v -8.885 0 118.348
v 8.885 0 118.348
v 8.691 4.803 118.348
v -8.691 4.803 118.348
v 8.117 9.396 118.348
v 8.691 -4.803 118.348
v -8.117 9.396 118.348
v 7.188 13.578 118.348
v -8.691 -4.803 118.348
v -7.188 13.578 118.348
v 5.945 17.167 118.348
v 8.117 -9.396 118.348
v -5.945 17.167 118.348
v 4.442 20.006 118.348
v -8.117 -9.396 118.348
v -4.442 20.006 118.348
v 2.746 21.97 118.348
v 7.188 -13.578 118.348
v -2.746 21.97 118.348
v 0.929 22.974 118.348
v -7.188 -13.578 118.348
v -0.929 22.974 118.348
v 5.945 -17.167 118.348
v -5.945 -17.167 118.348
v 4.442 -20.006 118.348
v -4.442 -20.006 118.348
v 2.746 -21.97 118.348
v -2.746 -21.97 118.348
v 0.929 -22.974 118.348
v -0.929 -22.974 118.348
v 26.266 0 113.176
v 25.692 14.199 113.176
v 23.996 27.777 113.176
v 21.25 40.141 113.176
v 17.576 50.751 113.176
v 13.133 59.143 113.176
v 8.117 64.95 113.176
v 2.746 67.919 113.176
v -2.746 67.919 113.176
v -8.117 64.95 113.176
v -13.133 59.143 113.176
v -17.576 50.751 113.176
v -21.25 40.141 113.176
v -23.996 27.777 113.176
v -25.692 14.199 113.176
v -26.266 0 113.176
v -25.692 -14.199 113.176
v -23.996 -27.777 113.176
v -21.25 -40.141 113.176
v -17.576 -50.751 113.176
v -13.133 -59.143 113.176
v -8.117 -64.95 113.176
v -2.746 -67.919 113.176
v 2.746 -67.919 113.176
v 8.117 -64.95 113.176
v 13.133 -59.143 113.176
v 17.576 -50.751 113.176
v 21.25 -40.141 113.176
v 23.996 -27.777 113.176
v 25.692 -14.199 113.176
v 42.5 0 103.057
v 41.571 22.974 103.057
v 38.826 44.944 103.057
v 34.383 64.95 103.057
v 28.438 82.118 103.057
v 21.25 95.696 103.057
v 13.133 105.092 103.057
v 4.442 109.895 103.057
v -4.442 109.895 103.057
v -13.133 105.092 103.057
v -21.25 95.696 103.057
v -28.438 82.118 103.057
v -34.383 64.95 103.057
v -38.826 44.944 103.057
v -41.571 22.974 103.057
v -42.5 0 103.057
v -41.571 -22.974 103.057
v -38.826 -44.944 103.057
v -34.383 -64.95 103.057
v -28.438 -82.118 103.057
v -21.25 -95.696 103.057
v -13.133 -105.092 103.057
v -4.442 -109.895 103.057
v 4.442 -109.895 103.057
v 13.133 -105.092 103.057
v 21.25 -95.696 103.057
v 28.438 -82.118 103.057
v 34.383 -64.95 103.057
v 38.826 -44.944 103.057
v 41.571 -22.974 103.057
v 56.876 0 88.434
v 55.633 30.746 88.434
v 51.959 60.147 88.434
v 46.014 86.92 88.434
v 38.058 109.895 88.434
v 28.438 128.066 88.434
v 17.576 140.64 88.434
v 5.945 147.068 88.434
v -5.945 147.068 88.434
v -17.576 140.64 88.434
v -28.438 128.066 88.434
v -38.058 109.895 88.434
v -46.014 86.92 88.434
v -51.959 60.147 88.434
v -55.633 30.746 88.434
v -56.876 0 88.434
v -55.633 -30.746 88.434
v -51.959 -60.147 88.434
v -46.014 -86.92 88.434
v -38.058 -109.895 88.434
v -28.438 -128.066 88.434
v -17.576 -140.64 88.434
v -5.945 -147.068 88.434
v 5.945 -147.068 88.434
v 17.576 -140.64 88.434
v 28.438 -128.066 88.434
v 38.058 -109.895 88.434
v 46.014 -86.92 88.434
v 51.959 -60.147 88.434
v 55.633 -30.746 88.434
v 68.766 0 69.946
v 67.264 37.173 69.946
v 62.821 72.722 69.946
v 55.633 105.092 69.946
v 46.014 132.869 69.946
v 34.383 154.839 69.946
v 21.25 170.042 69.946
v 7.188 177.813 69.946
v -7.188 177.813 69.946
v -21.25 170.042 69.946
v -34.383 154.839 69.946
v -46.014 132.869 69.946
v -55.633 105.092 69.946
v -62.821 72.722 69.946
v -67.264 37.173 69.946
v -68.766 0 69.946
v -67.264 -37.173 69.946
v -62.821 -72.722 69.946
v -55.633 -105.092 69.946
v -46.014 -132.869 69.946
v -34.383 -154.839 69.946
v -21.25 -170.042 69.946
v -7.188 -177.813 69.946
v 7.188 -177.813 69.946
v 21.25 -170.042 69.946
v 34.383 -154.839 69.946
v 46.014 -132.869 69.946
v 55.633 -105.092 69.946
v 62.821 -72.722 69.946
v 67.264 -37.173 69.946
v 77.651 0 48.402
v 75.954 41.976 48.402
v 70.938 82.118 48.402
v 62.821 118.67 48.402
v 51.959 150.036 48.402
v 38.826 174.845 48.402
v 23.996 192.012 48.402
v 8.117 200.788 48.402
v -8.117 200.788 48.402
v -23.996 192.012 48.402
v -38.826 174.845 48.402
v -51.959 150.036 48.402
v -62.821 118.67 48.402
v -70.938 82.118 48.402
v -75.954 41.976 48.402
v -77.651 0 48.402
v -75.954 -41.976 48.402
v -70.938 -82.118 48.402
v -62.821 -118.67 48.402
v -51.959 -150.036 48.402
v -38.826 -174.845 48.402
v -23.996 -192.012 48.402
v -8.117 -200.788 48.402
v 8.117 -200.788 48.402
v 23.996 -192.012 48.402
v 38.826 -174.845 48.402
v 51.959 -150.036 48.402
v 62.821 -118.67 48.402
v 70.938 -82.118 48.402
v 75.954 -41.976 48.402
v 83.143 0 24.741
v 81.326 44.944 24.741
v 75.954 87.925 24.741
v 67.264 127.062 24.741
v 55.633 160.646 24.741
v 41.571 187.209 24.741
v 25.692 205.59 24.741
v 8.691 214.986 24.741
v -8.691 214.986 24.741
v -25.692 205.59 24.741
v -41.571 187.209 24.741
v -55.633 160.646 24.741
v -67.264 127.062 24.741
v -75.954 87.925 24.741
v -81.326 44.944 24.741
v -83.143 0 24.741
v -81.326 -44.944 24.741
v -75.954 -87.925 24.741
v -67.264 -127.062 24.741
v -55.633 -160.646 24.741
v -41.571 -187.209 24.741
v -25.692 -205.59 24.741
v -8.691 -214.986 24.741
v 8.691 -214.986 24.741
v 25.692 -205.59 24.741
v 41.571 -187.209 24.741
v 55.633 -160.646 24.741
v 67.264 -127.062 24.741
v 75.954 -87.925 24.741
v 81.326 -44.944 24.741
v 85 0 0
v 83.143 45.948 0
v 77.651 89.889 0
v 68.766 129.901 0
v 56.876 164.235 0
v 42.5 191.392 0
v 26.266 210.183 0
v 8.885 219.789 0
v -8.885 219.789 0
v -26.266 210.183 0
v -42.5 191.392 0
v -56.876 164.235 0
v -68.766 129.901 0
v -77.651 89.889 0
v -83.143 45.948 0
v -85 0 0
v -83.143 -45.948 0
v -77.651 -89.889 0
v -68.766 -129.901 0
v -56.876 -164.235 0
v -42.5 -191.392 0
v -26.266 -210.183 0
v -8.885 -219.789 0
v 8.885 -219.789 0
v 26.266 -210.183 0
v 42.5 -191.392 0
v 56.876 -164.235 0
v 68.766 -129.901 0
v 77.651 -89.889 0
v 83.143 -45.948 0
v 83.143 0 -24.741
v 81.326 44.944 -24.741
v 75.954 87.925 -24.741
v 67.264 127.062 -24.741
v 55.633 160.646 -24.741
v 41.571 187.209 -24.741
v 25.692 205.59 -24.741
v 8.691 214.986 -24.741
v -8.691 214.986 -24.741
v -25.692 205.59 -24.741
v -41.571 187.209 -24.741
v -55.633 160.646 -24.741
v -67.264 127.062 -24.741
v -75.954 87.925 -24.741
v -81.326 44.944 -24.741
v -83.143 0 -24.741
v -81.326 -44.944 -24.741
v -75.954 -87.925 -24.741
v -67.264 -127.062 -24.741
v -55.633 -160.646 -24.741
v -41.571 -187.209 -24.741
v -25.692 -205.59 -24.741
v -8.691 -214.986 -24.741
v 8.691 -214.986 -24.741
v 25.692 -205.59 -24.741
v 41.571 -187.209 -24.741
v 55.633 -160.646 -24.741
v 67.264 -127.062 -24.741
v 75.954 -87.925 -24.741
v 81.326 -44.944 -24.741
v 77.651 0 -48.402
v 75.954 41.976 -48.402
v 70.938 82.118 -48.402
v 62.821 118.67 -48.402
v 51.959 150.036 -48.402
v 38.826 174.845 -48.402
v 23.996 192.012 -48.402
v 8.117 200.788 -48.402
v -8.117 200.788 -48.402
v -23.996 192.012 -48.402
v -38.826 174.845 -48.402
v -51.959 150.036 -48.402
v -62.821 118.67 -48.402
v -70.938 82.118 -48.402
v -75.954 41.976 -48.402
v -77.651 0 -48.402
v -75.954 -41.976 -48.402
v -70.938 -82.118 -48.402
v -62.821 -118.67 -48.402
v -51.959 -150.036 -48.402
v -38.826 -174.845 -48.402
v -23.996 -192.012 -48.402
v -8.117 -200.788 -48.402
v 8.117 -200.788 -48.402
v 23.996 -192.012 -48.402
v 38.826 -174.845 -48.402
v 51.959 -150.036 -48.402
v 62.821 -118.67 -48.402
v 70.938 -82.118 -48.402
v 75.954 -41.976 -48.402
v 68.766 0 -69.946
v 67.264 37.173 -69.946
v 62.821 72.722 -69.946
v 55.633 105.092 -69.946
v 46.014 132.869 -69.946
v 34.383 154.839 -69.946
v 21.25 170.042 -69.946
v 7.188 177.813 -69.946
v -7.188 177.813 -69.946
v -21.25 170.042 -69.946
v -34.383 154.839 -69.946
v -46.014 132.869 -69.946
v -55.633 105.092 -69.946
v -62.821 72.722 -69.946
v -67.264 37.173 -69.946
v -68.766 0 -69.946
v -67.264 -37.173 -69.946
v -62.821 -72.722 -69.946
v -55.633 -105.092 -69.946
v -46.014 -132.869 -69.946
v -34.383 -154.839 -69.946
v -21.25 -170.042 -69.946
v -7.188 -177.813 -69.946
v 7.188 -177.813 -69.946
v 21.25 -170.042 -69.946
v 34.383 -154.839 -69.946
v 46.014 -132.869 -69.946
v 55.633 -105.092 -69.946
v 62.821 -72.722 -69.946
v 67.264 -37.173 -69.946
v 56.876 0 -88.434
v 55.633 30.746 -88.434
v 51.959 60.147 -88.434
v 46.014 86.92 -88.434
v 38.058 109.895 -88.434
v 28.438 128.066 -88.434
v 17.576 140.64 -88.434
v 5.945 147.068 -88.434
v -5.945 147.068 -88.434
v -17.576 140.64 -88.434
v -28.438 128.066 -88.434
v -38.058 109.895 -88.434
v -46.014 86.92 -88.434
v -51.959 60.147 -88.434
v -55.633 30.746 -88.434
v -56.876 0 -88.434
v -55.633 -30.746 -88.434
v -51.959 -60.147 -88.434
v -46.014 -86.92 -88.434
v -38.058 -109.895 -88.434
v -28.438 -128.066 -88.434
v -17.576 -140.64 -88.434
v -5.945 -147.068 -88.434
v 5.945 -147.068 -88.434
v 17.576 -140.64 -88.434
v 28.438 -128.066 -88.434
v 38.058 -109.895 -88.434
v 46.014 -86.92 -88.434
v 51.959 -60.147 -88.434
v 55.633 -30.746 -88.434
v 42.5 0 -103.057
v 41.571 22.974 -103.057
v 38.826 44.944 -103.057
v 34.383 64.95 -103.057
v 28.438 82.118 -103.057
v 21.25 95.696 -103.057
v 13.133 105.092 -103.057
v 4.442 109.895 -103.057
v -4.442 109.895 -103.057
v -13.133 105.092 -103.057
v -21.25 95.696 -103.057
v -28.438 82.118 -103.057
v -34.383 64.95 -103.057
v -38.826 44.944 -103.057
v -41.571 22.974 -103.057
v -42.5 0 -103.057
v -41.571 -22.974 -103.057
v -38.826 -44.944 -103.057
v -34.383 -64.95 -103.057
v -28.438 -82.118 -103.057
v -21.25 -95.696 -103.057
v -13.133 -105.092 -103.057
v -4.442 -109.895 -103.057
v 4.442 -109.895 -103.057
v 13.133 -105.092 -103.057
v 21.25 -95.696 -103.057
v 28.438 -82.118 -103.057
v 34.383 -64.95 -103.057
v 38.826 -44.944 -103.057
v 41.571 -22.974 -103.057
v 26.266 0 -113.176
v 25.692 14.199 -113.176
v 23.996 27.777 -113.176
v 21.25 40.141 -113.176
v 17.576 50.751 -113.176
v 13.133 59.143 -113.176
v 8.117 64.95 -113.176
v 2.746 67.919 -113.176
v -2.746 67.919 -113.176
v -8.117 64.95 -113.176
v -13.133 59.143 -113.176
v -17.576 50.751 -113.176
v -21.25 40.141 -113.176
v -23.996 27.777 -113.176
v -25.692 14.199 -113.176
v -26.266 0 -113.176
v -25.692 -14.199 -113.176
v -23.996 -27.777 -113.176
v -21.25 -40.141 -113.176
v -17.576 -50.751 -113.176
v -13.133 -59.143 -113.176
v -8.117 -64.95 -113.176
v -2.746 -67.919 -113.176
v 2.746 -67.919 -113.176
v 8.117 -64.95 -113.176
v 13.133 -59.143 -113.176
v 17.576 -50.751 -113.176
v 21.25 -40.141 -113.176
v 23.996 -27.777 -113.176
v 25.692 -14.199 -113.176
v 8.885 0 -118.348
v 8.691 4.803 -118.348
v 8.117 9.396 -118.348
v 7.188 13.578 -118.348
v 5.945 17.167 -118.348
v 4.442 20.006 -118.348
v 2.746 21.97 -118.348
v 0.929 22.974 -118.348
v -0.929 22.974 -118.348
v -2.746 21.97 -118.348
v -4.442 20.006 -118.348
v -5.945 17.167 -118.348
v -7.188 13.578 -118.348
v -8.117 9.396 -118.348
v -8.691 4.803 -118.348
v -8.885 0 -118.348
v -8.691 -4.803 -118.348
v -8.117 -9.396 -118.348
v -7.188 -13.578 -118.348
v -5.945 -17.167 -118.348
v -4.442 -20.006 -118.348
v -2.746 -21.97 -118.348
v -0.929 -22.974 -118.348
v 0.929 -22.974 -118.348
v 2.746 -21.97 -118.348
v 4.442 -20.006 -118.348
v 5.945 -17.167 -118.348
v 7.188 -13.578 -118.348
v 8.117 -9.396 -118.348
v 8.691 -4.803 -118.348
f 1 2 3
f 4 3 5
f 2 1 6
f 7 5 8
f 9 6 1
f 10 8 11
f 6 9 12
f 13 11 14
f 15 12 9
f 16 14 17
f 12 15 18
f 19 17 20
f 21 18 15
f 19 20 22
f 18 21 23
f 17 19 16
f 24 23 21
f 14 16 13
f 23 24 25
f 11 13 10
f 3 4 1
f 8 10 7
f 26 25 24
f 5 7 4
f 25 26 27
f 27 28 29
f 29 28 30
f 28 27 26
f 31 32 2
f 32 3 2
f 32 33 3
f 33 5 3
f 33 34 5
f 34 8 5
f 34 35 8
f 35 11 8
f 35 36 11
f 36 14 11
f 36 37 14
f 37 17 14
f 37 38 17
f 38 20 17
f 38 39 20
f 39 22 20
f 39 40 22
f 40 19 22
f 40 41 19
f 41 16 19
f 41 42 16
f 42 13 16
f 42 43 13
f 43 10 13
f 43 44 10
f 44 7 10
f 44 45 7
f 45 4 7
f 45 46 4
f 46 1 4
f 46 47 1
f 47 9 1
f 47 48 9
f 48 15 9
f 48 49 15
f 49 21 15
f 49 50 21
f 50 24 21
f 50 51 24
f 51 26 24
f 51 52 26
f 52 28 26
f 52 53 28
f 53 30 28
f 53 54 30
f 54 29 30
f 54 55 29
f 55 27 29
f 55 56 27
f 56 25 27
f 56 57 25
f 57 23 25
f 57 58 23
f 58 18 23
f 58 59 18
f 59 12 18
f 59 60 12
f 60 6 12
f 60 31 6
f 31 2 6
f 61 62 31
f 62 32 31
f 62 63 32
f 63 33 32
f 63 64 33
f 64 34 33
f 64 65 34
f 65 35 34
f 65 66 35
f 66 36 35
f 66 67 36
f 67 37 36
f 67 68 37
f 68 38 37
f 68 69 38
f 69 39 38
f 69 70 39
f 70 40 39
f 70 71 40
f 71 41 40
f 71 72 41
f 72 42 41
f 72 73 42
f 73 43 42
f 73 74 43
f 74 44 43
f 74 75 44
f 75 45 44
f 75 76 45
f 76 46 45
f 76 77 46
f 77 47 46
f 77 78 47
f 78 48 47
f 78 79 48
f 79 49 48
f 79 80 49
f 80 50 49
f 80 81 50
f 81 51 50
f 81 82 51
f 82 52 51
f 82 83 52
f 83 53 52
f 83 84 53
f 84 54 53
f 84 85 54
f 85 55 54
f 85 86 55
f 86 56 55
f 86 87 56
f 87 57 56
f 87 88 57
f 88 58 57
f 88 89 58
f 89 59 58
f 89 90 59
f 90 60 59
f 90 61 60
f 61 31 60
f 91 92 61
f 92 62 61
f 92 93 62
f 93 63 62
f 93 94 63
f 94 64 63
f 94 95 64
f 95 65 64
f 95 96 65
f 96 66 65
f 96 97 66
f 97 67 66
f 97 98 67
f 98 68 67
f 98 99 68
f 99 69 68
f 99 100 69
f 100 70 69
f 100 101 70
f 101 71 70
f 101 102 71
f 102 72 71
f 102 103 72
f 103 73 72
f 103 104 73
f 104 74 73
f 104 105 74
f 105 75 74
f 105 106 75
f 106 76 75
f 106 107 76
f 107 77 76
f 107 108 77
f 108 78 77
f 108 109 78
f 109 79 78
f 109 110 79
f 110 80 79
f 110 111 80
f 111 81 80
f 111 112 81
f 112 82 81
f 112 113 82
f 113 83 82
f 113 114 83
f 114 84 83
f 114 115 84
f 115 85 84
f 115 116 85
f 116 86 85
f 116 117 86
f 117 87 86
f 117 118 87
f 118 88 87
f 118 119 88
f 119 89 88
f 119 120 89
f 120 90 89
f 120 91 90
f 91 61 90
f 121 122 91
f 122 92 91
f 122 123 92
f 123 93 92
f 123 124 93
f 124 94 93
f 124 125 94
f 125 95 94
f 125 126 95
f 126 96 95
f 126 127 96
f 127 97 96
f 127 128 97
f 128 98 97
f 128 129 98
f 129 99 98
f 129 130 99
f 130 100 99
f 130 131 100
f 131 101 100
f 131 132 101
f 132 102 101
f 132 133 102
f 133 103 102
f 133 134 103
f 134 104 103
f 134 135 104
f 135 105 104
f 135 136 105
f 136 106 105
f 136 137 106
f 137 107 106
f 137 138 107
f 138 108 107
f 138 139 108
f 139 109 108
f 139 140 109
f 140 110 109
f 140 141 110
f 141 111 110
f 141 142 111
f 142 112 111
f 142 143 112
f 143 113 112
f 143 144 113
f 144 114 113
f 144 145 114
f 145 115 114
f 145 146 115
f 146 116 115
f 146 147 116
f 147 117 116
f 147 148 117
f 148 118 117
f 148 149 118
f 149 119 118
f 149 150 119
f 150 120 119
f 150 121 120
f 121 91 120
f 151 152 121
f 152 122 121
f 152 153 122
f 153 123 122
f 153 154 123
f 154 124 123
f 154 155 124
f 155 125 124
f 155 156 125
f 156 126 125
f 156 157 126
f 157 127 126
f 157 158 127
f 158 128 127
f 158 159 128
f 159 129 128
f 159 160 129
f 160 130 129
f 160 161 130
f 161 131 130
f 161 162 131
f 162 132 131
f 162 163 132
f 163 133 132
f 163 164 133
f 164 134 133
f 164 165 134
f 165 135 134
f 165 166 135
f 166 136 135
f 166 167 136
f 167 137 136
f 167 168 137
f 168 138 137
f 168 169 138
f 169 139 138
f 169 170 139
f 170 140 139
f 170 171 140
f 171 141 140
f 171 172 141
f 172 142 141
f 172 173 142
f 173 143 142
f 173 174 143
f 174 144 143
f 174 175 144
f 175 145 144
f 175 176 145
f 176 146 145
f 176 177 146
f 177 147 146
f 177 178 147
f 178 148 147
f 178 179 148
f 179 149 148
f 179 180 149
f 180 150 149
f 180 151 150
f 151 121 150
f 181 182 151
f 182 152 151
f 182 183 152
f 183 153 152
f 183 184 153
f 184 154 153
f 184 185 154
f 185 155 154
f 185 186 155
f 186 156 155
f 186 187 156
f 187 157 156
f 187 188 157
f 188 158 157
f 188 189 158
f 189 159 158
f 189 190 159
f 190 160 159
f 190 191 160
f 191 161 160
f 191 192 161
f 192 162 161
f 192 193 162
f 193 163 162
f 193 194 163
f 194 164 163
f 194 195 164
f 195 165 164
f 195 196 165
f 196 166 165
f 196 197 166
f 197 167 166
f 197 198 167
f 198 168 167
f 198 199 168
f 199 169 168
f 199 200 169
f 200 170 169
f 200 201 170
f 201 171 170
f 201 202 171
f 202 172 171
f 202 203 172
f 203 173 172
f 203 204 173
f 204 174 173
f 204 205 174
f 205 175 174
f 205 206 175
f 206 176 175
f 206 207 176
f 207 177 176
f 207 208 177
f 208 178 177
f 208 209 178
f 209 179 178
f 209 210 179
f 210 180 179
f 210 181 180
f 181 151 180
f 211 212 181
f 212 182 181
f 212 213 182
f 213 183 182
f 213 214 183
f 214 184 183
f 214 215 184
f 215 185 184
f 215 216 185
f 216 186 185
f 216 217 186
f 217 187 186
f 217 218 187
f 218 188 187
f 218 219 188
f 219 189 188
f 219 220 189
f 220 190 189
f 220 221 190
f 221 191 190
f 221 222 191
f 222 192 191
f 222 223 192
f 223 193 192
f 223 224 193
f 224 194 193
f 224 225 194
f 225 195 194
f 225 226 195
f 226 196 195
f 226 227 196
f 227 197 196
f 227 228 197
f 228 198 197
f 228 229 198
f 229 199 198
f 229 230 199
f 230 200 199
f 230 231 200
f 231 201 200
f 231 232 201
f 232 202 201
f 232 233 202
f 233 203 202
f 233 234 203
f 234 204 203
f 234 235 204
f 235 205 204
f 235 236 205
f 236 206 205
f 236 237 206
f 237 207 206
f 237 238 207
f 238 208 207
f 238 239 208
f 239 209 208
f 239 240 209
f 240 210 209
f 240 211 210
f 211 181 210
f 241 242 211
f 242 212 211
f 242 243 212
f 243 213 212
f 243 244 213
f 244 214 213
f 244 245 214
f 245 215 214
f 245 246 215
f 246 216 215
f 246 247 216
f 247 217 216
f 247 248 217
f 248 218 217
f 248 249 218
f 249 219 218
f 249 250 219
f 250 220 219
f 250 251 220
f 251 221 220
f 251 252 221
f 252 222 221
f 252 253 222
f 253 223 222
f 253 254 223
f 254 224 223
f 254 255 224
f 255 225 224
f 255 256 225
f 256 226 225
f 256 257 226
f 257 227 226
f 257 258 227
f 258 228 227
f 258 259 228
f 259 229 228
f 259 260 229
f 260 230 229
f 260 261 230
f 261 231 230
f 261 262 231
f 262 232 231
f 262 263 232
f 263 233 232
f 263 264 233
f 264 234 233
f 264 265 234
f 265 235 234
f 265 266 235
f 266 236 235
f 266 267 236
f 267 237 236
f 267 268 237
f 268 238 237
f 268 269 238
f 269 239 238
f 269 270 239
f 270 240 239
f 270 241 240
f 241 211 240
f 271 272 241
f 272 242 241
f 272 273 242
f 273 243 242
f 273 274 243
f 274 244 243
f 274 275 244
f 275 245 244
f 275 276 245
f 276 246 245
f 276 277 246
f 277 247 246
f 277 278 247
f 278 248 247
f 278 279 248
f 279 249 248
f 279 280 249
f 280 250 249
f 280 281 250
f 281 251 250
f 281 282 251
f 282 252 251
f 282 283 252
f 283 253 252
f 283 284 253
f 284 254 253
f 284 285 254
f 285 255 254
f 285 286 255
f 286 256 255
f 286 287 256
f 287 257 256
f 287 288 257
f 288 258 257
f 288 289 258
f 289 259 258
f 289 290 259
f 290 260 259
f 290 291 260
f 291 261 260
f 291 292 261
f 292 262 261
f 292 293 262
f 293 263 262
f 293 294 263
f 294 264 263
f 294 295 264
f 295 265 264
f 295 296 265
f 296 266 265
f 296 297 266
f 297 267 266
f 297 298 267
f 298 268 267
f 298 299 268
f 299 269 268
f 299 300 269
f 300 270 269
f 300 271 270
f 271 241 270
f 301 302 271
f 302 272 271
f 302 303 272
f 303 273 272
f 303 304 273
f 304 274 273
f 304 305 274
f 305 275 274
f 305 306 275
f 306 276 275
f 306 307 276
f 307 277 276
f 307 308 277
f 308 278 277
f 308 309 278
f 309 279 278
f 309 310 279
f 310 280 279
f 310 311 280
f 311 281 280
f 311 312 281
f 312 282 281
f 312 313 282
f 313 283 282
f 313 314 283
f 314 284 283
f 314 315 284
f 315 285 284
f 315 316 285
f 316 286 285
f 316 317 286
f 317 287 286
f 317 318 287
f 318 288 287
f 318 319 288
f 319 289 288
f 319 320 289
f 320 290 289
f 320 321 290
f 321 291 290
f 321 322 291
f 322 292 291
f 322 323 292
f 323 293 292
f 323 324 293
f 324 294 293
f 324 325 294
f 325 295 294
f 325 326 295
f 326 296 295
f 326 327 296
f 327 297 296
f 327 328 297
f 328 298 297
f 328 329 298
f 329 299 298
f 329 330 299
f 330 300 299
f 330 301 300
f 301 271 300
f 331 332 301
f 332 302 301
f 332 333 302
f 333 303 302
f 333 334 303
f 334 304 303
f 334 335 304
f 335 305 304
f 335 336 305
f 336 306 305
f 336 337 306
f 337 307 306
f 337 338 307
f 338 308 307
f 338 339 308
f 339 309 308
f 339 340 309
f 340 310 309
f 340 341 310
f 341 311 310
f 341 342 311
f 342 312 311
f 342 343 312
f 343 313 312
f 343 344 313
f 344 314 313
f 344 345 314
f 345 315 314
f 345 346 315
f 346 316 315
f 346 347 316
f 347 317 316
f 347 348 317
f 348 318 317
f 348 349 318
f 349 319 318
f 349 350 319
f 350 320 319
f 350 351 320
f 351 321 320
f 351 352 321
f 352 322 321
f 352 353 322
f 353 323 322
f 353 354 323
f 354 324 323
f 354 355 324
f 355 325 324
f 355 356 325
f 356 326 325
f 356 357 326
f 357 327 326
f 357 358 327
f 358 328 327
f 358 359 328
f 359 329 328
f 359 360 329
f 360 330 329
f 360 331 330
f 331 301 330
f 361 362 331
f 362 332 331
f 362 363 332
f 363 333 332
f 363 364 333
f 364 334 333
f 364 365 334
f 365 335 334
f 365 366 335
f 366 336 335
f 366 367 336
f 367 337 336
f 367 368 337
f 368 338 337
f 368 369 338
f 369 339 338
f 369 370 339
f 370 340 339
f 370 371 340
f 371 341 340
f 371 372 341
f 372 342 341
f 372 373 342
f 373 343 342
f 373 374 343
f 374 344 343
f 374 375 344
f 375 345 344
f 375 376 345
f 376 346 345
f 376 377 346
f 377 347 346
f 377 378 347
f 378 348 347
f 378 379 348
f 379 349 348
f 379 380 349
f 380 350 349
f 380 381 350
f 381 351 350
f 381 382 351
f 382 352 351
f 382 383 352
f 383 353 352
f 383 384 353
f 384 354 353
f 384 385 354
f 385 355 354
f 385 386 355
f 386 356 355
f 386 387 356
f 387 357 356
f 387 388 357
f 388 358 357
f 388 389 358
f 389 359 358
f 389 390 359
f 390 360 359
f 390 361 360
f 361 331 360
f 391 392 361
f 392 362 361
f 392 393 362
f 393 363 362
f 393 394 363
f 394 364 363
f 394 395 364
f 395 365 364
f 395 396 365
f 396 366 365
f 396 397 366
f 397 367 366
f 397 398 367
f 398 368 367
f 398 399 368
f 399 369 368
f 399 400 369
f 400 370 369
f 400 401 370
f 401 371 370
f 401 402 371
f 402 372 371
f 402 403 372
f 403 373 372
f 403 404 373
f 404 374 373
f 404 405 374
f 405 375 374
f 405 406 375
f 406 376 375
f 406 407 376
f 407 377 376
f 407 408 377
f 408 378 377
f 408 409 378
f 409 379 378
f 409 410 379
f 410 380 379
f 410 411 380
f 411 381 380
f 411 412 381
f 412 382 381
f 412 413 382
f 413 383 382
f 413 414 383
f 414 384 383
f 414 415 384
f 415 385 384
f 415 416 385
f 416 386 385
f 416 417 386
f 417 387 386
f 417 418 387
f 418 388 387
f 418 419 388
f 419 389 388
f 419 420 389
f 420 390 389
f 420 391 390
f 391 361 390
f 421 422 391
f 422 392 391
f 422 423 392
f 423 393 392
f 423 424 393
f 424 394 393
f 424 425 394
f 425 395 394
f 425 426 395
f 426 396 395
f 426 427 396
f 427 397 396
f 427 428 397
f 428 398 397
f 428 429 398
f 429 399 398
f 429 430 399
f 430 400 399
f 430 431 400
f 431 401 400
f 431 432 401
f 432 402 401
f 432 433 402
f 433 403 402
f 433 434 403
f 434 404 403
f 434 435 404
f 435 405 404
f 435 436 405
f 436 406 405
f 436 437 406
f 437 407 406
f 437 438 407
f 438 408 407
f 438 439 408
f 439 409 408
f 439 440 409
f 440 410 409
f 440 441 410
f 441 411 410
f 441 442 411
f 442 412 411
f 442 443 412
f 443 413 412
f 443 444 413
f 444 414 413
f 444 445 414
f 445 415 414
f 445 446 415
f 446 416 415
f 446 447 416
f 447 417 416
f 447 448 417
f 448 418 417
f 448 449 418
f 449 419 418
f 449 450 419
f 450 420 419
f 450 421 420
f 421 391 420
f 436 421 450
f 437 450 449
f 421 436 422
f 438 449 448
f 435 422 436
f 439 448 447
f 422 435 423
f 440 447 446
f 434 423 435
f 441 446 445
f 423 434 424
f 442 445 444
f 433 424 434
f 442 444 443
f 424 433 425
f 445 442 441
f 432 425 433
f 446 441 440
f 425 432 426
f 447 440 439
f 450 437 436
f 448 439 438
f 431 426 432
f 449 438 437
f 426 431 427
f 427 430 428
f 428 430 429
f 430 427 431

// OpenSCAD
// Generated by SolidPython 1.0.1 on 2020-07-29 00:46:46


scale(v = [5, 13, 7]) {
	sphere(r = 17);
}
/***********************************************
*********      SolidPython code:      **********
************************************************
 
# import packages: SolidPython
from solid import *
from solid.utils import *
from itertools import chain, combinations, permutations


class Resize:

    def __init__(self, scad_file):
        self.scad_file = scad_file
        #self.scad_file = import_scad(scad_file)
        # cone/cylinder param:
        self.r1 = 0
        self.r2 = 0
        self.h = 0
        # rectangular prism param:
        self.w = 0
        self.l = 0
        # ellipse param:
        self.r = 0

    # import OpenScad code (file name corresponds to shape)


    # classify shape + parameters
    def assign(self, param1, param2, param3):
        if self.scad_file == 'cone.scad':
            self.r1 = param1
            self.r2 = param2
            self.h = param3
        elif self.scad_file == 'cylinder.scad':
            self.r1 = param1
            self.r2 = param2
            self.h = param3
        elif self.scad_file == 'rectangularPrism.scad':
            self.h = param1
            self.l = param2
            self.w = param3
        else:
            self.r = param1
            self.h = param2

    # resize parameters
    def iterate(self):
        x = range(3, 20, 2)
        i = 1
        if self.scad_file == 'cone.scad':
            tempList = list(permutations(x, 2))
            for temp in tempList:
                param1 = temp[0]
                param2 = temp[1]
                filepath = 'produced_scad_files/' + 'cone' + str(param1) + '_' + str(param2) + '_' + '.scad'
                scad_render_to_file(cylinder(h=param1, r1=param2, r2=0), filepath)

        elif self.scad_file == 'cylinder.scad':
            tempList = list(permutations(x, 3))
            for temp in tempList:
                param1 = temp[0]
                param2 = temp[1]
                filepath = 'produced_scad_files/' + 'cylinder' + str(param1) + '_' + str(param2) + '_' + '.scad'
                scad_render_to_file(cylinder(h=param1, r1=param2, r2=param2), filepath)

        elif self.scad_file == 'rectangularPrism.scad':
            tempList = list(permutations(x, 3))
            for temp in tempList:
                param1 = temp[0]
                param2 = temp[1]
                param3 = temp[2]
                filepath = 'produced_scad_files/' + 'rectangularPrism' + str(param1) + '_' + str(param2) + '_' + str(
                    param3) + '.scad'
                scad_render_to_file(cube(size=(param1, param2, param3)), filepath)

        elif self.scad_file == 'ellipse.scad':
            tempList = list(permutations(x, 4))
            for temp in tempList:
                param1 = temp[0]
                param2 = temp[1]
                param3 = temp[2]
                param4 = temp[3]
                filepath = 'produced_scad_files/' + 'ellipse' + str(param1) + '_' + str(param2) + '_' + str(param3) + '_' + str(param4) + '.scad'
                scad_render_to_file(scale([param1, param2, param3])(sphere(r=param4)), filepath)

    def render_to_scadfile(self):
        scad_render_to_file(scad, 'example.scad') 
 
************************************************/
